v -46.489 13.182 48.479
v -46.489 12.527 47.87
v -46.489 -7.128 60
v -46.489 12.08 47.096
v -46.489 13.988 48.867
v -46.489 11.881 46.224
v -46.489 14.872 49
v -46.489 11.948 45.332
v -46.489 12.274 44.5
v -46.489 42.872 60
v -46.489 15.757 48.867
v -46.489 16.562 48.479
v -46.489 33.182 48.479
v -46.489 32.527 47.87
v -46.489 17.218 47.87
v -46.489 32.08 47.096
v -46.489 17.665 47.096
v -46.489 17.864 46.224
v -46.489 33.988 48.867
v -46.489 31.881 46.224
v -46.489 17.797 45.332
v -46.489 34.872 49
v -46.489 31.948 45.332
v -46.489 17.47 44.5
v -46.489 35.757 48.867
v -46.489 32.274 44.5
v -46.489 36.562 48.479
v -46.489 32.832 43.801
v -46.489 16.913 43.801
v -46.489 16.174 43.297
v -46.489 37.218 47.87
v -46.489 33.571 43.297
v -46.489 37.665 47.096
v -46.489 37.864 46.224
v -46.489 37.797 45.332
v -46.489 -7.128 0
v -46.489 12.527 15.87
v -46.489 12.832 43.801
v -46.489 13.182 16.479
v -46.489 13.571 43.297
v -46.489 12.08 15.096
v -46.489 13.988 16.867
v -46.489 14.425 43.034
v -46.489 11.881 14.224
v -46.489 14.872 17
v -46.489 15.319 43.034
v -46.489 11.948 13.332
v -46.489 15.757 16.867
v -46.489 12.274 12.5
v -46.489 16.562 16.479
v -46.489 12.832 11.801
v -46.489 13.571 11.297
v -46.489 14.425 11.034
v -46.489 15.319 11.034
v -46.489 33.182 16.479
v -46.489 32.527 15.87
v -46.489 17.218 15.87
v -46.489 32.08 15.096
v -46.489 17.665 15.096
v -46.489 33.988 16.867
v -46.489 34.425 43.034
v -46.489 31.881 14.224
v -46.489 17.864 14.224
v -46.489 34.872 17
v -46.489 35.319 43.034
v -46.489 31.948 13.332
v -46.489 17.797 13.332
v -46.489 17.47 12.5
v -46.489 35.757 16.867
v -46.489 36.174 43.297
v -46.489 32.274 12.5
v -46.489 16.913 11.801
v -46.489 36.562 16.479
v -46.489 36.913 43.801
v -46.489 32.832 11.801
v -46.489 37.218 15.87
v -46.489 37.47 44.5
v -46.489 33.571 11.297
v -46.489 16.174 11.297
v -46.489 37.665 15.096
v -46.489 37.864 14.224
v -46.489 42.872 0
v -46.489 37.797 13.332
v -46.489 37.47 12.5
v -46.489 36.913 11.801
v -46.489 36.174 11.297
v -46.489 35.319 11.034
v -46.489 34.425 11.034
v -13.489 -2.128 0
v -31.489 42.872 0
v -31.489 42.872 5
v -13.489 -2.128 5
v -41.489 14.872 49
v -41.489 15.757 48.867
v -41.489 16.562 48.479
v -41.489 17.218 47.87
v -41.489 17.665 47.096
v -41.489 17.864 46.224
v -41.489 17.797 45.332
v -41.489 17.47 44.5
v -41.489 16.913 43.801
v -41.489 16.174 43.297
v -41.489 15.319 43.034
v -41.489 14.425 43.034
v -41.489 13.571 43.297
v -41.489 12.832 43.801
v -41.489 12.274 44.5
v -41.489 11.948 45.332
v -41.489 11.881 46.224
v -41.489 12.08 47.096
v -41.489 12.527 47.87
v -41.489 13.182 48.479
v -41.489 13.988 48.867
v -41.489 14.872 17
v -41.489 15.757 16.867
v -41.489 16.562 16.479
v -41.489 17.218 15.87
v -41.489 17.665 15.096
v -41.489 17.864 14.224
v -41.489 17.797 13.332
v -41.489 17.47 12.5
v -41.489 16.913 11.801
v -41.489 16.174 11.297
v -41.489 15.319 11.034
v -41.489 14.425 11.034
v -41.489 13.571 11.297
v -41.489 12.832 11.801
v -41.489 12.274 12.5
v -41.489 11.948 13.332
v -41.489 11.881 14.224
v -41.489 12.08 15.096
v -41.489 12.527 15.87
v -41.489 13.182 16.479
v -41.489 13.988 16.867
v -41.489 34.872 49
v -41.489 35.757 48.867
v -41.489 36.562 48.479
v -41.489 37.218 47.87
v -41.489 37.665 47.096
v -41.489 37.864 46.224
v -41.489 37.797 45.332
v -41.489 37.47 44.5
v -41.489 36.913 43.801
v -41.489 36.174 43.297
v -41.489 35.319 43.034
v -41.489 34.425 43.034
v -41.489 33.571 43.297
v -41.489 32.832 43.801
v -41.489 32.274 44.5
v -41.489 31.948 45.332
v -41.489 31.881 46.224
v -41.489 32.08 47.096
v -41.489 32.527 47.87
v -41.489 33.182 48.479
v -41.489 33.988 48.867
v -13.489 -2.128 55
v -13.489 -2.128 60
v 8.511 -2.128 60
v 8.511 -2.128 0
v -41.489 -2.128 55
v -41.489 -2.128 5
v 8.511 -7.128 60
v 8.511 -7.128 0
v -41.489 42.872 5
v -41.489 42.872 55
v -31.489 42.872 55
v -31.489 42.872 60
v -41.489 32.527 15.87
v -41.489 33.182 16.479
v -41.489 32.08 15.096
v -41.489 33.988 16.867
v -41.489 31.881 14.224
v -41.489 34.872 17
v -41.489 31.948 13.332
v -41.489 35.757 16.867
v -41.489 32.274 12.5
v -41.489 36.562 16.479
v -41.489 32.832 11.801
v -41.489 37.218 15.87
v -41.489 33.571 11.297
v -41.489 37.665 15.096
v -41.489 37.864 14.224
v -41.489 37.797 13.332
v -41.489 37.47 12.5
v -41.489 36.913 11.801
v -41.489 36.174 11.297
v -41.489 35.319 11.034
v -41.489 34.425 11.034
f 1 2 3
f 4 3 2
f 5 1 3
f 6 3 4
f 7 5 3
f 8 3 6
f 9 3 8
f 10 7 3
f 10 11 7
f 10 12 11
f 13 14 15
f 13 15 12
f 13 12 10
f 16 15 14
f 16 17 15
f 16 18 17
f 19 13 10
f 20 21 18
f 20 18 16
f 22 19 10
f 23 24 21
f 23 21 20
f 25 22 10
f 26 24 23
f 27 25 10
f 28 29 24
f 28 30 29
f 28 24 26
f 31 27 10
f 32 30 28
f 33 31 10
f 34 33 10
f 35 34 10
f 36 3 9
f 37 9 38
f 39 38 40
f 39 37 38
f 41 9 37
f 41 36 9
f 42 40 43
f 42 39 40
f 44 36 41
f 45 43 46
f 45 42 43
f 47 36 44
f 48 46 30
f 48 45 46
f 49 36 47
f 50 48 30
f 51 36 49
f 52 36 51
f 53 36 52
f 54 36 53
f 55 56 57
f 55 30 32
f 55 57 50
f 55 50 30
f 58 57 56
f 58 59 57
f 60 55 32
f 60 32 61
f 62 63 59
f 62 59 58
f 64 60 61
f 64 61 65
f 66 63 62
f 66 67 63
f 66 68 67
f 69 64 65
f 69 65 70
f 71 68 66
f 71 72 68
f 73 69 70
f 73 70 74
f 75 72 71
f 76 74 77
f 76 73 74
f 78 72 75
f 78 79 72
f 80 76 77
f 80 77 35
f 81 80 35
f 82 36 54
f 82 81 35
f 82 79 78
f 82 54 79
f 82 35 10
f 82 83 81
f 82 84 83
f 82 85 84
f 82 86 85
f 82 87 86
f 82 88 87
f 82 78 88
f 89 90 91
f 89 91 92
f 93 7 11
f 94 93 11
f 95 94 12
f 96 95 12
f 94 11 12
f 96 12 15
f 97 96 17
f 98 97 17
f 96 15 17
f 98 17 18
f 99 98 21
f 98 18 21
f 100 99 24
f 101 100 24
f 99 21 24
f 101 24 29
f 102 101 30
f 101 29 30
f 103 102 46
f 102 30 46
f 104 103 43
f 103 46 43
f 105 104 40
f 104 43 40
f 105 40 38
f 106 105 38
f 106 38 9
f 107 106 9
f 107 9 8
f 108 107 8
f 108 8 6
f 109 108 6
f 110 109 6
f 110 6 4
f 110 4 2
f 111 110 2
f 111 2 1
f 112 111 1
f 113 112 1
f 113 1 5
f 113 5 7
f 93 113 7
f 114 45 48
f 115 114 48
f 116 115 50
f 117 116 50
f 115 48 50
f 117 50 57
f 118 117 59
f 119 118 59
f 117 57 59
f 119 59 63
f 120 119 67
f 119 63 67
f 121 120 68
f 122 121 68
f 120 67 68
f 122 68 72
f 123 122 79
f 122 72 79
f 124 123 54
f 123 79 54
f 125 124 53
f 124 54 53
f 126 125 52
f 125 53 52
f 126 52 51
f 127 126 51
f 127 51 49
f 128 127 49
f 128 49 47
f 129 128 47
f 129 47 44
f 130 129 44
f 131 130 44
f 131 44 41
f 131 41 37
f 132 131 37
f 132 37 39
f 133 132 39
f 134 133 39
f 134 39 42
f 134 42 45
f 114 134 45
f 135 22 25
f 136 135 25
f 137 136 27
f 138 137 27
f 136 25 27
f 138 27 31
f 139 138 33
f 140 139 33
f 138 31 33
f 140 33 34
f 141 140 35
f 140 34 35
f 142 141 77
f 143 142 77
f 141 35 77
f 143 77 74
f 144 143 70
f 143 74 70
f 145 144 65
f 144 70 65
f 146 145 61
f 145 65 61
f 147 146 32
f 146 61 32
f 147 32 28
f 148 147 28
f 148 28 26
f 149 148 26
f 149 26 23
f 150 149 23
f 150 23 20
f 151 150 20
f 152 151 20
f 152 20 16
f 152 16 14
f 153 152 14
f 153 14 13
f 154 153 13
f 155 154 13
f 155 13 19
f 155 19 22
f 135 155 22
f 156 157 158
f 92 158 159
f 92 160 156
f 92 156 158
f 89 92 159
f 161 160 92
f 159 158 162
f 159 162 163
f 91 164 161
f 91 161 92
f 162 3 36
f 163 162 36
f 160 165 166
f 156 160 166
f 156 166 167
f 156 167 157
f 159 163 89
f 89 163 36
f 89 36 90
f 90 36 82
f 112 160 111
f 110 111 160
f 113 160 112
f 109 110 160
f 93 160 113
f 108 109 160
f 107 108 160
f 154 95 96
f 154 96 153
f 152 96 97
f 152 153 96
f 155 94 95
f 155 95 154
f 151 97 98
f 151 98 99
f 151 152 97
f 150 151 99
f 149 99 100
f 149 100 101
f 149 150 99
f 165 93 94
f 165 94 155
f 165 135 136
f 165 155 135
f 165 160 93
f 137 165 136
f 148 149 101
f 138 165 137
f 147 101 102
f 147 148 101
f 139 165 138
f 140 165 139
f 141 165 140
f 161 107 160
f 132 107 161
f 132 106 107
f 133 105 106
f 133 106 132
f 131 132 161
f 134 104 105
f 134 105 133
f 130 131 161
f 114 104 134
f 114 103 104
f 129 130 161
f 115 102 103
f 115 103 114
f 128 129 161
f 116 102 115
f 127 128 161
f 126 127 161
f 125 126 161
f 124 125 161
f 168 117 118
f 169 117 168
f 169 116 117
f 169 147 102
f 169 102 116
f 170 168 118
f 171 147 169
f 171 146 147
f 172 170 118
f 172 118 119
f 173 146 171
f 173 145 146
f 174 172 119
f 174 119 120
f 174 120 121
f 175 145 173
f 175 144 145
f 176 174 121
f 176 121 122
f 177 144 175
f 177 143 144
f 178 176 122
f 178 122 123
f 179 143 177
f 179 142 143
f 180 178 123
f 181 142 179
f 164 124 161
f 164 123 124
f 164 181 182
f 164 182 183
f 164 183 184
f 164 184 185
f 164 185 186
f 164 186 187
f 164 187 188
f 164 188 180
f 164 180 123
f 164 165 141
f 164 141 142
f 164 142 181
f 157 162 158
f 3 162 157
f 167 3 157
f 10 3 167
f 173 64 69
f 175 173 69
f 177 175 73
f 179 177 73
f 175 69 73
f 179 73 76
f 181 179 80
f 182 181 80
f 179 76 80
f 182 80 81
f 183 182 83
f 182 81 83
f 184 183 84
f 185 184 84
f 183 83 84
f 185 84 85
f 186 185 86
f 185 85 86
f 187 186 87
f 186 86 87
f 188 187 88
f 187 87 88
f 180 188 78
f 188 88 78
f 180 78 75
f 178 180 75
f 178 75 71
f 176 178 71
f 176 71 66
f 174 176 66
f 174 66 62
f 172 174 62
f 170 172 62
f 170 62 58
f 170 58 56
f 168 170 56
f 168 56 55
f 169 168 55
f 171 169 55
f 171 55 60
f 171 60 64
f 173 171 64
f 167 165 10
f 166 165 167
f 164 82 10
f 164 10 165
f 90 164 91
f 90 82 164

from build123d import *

# Parameters (mm, degrees)
EXTRUDE_1_DEPTH     = 60
SKETCH_2_W          = 34.644902364
SKETCH_2_H          = 50
CUT_EXTRUDE_1_DEPTH = 45
SKETCH_3_R          = 3
SKETCH_3_R_2        = 2.5
CUT_EXTRUDE_2_DEPTH = 91.891477881
SKETCH_4_R          = 3
CUT_EXTRUDE_3_DEPTH = 82.627431502
SKETCH_5_W          = 60
SKETCH_5_H          = 5
EXTRUDE_2_DEPTH     = 50


with BuildPart() as part:
    # 草图1 → 凸台-拉伸1 (new body)
    with BuildSketch(Plane.XY):
        Polygon((-11.489361702, -7.127659574), (-46.489361702, -7.127659574), (-46.489361702, 42.872340426), (-31.489361702, 42.872340426), align=None)
    extrude(amount=EXTRUDE_1_DEPTH)

    # 草图2 → 切除-拉伸1 (cut)
    with BuildSketch(Plane(origin=(0, 42.872340426, 0), x_dir=(1, 0, 0), z_dir=(0, 1, 0))):
        with Locations((-24.16691052, -30)):
            Rectangle(SKETCH_2_W, SKETCH_2_H)
    extrude(amount=-CUT_EXTRUDE_1_DEPTH, mode=Mode.SUBTRACT)

    # 草图3 → 切除-拉伸2 (cut, through all)
    with BuildSketch(Plane.XZ.offset(7.127659574)):
        with Locations((-35.489361702, 48)):
            Circle(SKETCH_3_R)
        with Locations(Location((-35.489361702, 12, 0), (0, 0, 270))):
            Circle(SKETCH_3_R)
        with Locations(Location((-19.489361702, 12, 0), (0, 0, 270))):
            Circle(SKETCH_3_R_2)
        with Locations((-19.489361702, 48)):
            Circle(SKETCH_3_R_2)
    extrude(amount=-CUT_EXTRUDE_2_DEPTH, mode=Mode.SUBTRACT)

    # 草图4 → 切除-拉伸3 (cut, through all)
    with BuildSketch(Plane.ZY.offset(46.489361702)):
        with Locations((14, 34.872340426)):
            Circle(SKETCH_4_R)
        with Locations((46, 34.872340426)):
            Circle(SKETCH_4_R)
        with Locations((14, 14.872340426)):
            Circle(SKETCH_4_R)
        with Locations((46, 14.872340426)):
            Circle(SKETCH_4_R)
    extrude(amount=-CUT_EXTRUDE_3_DEPTH, mode=Mode.SUBTRACT)

    # 草图5 → 凸台-拉伸2 (add)
    with BuildSketch(Plane(origin=(-41.489361702, 0, 0), x_dir=(0, 0, -1), z_dir=(1, 0, 0))):
        with Locations((-30, -4.627659574)):
            Rectangle(SKETCH_5_W, SKETCH_5_H)
    extrude(amount=EXTRUDE_2_DEPTH)


solid = part.part
